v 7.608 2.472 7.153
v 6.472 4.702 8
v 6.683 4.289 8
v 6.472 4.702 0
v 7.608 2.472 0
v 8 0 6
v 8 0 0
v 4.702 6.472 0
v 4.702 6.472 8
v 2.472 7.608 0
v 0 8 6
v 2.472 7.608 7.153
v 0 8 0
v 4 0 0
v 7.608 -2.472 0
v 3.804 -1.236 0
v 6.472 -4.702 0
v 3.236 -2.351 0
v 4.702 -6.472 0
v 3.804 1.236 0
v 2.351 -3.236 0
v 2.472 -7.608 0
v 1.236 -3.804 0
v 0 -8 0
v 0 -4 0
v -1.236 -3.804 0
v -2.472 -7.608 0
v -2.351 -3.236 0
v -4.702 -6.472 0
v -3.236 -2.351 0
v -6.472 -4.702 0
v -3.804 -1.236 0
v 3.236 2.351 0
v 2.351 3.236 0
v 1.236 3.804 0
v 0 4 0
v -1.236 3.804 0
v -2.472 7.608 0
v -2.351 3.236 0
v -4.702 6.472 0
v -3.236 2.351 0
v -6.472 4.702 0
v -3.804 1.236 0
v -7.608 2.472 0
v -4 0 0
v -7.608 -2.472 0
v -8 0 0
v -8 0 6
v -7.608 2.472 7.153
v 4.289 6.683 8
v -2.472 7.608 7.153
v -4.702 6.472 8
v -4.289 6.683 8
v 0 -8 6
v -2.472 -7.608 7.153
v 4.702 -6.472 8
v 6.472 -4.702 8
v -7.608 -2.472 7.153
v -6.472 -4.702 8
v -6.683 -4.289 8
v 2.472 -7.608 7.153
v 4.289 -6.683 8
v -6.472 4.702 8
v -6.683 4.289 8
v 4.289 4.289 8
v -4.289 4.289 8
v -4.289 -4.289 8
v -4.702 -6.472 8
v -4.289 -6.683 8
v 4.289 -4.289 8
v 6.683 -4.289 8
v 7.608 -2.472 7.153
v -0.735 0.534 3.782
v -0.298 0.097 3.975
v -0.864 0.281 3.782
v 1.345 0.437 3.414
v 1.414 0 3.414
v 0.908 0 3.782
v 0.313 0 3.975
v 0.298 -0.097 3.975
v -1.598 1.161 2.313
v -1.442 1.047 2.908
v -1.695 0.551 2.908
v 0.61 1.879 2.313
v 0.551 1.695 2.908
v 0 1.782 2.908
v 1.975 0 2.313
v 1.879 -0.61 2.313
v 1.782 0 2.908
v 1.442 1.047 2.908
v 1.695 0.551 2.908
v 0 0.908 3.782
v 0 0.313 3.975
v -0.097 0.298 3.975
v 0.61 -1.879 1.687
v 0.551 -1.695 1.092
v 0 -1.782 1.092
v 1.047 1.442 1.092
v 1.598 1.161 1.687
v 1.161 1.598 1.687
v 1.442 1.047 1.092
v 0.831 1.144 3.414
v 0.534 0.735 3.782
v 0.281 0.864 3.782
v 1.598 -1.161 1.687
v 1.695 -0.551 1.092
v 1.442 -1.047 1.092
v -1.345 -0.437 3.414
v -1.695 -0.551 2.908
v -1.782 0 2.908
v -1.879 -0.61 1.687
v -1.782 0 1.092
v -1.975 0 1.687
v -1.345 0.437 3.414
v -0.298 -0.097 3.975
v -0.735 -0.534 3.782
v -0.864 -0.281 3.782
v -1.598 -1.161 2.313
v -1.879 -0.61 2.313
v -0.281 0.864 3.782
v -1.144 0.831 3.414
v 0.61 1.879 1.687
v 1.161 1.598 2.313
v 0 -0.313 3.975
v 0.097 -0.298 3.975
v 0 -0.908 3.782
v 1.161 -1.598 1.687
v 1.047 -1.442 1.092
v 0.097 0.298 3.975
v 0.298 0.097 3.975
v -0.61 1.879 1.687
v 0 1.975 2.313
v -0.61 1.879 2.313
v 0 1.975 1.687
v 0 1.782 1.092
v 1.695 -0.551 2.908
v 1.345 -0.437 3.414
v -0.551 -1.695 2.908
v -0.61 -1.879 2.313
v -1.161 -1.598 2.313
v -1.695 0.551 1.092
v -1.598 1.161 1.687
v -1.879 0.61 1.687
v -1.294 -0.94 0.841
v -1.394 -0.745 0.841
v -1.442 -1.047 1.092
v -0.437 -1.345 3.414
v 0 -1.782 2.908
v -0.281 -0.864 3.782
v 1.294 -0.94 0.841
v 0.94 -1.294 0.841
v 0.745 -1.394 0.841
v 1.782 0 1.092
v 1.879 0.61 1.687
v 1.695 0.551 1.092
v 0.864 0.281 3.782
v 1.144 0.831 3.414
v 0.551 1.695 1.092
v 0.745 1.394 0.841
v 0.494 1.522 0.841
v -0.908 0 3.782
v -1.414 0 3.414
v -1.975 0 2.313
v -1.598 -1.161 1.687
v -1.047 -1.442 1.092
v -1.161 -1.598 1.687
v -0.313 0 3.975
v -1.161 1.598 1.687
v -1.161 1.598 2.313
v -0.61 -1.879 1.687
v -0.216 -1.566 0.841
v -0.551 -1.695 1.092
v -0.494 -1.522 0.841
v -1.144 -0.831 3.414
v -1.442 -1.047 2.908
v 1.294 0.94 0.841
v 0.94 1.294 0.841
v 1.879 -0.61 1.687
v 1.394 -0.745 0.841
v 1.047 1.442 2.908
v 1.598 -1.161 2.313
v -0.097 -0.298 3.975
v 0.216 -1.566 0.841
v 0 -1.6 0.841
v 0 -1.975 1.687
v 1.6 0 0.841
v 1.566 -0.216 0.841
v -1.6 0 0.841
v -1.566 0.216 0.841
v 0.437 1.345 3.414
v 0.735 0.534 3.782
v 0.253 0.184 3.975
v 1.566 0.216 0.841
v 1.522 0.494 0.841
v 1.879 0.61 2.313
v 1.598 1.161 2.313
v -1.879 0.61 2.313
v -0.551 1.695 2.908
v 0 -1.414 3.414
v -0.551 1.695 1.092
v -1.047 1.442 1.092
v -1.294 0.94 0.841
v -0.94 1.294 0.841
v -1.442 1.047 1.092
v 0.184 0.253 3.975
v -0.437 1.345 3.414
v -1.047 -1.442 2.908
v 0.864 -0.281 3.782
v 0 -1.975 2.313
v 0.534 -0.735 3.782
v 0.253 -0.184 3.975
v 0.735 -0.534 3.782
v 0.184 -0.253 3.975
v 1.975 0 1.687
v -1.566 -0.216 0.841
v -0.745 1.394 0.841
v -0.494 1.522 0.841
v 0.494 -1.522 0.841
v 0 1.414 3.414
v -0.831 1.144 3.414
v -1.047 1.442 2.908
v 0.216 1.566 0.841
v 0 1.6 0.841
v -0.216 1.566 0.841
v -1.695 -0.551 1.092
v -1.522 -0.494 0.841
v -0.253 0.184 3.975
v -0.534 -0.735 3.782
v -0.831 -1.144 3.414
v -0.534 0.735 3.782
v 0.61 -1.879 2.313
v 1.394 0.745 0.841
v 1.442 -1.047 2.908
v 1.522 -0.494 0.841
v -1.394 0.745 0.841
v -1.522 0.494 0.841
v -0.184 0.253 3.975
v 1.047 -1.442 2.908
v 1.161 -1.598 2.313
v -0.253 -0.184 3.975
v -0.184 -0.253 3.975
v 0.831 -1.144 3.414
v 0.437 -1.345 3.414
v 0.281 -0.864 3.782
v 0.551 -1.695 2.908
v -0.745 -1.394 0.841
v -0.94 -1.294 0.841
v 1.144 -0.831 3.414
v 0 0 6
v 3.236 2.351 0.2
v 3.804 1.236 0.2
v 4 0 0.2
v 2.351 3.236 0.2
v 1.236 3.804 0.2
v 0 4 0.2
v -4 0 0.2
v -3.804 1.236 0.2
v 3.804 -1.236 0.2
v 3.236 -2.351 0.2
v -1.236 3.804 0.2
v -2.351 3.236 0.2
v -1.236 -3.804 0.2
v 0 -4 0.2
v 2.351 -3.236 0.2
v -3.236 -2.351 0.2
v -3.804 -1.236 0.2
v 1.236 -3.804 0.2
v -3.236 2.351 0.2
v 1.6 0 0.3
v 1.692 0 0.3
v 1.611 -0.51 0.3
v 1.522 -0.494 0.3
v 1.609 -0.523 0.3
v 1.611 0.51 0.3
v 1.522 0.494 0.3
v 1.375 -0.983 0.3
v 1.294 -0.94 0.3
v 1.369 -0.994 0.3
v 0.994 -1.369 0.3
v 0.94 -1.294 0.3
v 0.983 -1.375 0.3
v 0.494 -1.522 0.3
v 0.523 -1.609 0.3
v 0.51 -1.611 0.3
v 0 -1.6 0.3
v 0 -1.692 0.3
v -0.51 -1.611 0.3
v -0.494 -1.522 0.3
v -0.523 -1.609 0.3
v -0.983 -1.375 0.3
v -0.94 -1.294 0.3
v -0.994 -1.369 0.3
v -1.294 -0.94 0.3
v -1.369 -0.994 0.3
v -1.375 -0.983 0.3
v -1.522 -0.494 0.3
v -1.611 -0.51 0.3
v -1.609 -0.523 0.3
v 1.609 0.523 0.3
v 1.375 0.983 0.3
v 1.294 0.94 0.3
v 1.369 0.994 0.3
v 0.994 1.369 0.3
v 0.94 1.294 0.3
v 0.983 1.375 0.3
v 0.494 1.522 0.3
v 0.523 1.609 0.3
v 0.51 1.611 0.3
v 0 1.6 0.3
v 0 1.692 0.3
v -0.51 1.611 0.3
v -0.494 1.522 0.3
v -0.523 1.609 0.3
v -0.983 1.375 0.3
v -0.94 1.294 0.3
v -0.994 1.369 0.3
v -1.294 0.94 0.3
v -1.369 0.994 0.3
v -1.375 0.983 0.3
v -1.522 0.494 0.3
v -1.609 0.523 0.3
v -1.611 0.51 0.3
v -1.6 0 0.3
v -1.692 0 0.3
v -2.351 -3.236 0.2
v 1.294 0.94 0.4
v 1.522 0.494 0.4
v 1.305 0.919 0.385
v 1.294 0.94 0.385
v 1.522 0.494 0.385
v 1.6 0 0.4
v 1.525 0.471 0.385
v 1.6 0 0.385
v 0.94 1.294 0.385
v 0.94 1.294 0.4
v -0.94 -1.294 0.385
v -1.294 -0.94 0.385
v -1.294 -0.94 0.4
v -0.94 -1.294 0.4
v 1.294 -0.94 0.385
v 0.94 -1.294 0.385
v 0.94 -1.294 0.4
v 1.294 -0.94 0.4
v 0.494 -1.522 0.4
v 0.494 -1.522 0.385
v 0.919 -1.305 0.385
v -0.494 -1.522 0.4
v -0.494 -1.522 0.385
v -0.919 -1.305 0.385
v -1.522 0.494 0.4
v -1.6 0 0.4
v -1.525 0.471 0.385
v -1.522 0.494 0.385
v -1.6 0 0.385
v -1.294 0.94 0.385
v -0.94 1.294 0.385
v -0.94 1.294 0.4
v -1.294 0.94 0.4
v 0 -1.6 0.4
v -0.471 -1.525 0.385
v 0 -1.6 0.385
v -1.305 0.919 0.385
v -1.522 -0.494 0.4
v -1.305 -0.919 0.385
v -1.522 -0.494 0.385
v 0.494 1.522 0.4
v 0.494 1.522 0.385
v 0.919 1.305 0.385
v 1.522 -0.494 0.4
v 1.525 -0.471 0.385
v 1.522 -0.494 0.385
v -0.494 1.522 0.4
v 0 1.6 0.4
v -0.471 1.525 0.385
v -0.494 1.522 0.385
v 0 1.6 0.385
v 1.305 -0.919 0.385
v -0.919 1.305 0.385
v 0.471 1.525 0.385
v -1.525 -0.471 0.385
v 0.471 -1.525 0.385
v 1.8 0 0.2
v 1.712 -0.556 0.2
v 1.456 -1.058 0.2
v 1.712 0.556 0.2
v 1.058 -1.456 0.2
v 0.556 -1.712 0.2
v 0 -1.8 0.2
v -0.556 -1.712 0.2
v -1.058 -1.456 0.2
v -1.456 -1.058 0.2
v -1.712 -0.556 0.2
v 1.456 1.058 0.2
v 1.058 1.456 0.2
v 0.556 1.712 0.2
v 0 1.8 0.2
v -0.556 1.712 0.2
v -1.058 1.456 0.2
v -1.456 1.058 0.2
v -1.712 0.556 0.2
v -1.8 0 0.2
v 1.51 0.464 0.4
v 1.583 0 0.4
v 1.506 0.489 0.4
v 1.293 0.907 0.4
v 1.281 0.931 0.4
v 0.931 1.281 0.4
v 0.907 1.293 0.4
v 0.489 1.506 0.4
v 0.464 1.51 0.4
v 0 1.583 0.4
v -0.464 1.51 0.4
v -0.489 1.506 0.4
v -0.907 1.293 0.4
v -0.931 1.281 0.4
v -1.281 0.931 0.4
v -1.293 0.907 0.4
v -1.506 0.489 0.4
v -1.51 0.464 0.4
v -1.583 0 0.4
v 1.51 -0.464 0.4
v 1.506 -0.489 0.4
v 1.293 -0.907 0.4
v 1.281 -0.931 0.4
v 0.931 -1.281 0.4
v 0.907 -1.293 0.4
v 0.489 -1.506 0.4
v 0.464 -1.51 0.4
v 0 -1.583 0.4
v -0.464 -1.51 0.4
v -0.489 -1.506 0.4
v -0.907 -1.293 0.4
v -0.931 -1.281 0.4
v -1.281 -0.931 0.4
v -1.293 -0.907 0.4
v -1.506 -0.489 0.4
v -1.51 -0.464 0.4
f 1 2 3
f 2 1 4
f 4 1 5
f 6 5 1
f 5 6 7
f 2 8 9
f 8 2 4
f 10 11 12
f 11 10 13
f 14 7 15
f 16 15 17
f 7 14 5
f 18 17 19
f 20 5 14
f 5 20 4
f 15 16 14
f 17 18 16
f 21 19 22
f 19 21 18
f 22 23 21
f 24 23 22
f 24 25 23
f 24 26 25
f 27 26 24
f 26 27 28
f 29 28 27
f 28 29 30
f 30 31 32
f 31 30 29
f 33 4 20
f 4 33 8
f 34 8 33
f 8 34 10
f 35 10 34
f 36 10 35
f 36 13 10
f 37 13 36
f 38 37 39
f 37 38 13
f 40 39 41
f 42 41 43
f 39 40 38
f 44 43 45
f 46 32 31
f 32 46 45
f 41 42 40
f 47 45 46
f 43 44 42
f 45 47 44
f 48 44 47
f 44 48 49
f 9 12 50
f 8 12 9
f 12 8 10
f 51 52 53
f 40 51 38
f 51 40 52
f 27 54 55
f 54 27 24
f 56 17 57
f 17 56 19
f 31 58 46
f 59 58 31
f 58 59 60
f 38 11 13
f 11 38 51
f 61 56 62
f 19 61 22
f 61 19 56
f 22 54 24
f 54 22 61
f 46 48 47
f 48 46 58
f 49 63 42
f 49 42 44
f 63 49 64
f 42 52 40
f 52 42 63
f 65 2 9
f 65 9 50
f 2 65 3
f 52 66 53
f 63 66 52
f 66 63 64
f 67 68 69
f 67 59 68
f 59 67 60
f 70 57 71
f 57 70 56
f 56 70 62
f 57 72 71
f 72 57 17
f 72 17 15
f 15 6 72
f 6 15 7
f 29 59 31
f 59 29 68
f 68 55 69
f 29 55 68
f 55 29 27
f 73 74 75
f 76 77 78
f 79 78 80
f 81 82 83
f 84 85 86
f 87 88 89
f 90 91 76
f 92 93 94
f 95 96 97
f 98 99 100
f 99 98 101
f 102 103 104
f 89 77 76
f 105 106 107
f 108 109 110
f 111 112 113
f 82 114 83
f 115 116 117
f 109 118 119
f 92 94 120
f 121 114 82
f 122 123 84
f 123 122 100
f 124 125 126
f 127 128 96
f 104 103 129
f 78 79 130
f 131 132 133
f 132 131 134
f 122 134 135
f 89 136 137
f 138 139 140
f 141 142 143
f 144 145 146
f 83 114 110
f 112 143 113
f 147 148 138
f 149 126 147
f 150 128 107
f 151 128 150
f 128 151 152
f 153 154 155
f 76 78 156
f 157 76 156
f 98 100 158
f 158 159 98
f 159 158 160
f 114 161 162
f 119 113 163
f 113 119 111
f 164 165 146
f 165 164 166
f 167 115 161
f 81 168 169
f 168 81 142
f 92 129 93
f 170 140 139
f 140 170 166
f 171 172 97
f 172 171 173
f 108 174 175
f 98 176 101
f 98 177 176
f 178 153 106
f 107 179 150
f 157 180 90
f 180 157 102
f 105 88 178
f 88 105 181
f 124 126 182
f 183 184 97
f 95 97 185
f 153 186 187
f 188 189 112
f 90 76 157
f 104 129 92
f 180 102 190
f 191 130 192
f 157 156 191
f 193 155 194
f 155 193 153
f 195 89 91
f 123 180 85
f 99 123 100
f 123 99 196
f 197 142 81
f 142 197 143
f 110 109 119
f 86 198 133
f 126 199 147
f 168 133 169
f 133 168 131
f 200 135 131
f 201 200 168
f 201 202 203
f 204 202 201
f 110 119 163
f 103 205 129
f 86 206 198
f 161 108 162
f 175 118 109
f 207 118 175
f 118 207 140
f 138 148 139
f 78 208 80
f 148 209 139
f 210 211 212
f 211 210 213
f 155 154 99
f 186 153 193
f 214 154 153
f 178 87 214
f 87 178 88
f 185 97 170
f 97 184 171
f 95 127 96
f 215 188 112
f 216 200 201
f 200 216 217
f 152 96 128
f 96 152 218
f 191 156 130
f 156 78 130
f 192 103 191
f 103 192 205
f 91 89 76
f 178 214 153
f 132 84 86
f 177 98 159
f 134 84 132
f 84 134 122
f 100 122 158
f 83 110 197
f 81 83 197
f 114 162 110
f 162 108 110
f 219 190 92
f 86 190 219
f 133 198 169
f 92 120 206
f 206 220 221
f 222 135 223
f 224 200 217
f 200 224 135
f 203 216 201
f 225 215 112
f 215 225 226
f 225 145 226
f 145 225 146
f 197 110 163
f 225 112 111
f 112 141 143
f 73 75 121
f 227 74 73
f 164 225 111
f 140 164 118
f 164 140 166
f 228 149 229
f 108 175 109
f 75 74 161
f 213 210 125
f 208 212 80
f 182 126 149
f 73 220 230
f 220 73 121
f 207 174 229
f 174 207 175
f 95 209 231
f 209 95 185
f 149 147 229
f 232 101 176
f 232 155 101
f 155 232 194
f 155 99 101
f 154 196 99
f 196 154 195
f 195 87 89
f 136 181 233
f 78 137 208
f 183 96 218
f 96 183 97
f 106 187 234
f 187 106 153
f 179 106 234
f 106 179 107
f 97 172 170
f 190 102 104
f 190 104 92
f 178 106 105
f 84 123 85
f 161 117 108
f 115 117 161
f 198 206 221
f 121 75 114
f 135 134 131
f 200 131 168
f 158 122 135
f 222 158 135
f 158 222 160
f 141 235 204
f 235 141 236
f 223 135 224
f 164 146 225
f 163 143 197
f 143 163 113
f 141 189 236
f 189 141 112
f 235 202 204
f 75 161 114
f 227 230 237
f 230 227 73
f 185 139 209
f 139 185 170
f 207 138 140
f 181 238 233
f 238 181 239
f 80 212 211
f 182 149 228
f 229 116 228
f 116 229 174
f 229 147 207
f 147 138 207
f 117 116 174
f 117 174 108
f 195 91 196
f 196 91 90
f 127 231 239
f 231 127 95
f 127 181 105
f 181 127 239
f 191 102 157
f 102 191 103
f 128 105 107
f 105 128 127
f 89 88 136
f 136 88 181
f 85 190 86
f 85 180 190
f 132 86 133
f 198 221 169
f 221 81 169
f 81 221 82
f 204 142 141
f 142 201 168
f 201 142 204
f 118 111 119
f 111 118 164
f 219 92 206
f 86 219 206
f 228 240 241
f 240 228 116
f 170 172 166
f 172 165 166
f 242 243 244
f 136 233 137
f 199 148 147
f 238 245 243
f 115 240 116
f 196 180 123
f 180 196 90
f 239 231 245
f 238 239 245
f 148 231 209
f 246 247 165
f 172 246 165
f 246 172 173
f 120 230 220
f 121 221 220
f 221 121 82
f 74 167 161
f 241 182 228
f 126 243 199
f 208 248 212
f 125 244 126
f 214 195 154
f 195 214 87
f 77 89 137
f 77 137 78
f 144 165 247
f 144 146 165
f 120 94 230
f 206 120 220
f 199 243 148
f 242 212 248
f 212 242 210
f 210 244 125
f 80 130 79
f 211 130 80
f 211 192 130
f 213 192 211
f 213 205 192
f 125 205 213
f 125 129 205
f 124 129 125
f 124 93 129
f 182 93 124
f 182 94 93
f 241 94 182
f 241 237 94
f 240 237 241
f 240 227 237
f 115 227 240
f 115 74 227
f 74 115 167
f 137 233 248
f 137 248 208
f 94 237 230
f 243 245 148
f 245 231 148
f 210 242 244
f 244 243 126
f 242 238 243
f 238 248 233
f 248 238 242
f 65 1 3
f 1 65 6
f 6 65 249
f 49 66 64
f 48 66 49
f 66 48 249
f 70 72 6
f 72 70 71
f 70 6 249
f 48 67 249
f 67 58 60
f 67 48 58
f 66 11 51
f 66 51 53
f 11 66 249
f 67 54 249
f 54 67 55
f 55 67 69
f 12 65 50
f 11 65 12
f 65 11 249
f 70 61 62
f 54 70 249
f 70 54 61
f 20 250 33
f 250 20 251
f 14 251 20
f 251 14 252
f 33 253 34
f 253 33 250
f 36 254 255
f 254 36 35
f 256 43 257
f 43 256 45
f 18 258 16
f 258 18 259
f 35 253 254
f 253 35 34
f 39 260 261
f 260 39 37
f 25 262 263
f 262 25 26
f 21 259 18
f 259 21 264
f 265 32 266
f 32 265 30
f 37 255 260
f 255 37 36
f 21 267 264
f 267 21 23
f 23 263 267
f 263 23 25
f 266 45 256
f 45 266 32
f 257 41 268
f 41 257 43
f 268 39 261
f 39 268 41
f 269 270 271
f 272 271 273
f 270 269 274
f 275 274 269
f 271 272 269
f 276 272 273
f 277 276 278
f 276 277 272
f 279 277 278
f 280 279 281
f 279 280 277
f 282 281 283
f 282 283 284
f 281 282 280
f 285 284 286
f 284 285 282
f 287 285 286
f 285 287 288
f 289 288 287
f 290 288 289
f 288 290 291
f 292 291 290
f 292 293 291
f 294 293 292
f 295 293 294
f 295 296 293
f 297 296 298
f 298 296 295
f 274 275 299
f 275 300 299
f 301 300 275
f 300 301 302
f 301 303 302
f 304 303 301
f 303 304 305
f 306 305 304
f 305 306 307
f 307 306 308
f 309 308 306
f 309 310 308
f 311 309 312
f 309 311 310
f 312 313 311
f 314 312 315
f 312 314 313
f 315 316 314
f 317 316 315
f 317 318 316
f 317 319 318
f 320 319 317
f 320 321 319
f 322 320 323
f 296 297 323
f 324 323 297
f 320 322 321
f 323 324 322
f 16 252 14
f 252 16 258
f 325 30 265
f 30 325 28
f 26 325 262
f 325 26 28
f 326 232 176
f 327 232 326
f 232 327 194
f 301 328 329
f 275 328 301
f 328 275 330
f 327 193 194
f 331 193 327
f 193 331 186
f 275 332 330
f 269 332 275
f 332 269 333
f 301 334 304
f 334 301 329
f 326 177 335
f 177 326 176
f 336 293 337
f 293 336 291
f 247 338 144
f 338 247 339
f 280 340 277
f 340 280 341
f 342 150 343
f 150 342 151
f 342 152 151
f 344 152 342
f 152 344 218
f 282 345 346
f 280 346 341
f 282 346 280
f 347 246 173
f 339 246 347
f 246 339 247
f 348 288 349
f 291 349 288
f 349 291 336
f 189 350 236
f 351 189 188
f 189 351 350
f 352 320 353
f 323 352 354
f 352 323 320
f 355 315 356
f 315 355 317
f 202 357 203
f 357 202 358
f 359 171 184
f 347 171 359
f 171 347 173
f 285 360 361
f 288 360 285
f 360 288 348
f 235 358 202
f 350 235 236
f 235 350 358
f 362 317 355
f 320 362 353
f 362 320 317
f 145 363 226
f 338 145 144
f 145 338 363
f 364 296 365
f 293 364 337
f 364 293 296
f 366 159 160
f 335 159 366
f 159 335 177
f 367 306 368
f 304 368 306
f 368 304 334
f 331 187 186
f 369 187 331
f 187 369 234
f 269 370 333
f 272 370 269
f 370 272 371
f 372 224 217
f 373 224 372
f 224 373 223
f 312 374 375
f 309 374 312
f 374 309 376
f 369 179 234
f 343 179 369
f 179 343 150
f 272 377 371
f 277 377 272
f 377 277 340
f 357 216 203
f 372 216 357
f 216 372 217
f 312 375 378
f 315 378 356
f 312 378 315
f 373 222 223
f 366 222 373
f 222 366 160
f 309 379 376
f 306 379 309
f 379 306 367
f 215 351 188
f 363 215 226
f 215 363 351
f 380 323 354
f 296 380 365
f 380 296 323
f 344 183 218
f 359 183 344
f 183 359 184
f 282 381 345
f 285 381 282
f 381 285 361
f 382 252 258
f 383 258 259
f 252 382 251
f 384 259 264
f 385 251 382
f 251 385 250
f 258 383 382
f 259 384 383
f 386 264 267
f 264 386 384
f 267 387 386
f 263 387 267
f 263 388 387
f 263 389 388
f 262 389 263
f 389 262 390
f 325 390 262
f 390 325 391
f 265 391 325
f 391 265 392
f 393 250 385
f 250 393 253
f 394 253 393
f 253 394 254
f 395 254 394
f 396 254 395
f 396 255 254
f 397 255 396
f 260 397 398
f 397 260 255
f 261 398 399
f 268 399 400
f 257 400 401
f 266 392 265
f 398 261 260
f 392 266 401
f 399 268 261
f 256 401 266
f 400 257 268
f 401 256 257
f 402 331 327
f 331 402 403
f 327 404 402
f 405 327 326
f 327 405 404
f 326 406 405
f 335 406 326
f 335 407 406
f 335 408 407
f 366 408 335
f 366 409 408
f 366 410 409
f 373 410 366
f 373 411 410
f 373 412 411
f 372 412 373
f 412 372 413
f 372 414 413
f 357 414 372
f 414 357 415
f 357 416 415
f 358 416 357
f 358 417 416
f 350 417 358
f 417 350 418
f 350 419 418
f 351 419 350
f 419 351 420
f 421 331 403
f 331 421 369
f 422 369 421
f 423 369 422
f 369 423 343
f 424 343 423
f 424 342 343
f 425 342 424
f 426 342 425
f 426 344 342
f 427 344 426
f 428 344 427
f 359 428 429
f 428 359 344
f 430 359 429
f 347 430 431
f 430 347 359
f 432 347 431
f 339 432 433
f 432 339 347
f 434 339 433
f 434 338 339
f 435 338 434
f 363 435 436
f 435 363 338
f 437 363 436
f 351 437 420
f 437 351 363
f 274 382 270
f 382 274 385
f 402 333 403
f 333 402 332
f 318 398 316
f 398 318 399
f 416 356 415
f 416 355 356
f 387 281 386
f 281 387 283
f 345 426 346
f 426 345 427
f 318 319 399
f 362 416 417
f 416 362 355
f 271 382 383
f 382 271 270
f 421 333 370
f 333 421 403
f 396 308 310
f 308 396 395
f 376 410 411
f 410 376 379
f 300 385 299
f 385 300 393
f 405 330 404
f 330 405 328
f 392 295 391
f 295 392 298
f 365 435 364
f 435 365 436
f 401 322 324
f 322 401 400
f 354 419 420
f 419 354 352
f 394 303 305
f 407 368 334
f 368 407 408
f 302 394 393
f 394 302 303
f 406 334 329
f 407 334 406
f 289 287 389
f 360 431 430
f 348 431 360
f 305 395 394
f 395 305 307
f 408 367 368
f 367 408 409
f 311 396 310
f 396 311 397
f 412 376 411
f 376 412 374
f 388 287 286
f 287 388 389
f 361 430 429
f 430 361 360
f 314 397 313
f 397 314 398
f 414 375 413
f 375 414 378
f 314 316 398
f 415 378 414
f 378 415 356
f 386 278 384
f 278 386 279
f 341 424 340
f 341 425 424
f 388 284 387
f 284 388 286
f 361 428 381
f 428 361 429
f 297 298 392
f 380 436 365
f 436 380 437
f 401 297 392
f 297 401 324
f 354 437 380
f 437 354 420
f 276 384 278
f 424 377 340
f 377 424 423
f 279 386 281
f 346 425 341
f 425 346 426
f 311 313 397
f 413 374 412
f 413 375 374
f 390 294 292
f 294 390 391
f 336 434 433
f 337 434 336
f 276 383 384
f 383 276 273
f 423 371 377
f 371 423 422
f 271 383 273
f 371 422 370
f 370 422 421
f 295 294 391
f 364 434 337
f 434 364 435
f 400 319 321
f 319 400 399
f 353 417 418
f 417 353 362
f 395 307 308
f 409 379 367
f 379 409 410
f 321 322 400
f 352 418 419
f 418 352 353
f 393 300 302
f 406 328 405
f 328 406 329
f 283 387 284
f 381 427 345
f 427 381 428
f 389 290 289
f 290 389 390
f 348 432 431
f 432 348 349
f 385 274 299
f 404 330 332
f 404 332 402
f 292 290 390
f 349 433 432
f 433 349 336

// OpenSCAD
$fn=20;

difference(){ 
    cylinder(8,8,8);
    translate([0,0,2])   sphere(2);
    translate([-8,0,6]) rotate([25,0,0])  cube([16,8,8]);    
    translate([-8,0,6]) rotate([65,0,0])  cube([16,8,8]);    
    translate([0,-8,6]) rotate([25,0,90])  cube([16,8,8]);    
    translate([0,-8,6]) rotate([65,0,90])  cube([16,8,8]);    
    cylinder(0.3,4,4);
    cylinder(1,1.6,1.6);
//    translate([0,0,1.2])   sphere(2);
    }
    translate([0,0,0.2]) 
    difference(){ cylinder(0.2,4,4); cylinder(1.2,1.8,0.5);}
 
